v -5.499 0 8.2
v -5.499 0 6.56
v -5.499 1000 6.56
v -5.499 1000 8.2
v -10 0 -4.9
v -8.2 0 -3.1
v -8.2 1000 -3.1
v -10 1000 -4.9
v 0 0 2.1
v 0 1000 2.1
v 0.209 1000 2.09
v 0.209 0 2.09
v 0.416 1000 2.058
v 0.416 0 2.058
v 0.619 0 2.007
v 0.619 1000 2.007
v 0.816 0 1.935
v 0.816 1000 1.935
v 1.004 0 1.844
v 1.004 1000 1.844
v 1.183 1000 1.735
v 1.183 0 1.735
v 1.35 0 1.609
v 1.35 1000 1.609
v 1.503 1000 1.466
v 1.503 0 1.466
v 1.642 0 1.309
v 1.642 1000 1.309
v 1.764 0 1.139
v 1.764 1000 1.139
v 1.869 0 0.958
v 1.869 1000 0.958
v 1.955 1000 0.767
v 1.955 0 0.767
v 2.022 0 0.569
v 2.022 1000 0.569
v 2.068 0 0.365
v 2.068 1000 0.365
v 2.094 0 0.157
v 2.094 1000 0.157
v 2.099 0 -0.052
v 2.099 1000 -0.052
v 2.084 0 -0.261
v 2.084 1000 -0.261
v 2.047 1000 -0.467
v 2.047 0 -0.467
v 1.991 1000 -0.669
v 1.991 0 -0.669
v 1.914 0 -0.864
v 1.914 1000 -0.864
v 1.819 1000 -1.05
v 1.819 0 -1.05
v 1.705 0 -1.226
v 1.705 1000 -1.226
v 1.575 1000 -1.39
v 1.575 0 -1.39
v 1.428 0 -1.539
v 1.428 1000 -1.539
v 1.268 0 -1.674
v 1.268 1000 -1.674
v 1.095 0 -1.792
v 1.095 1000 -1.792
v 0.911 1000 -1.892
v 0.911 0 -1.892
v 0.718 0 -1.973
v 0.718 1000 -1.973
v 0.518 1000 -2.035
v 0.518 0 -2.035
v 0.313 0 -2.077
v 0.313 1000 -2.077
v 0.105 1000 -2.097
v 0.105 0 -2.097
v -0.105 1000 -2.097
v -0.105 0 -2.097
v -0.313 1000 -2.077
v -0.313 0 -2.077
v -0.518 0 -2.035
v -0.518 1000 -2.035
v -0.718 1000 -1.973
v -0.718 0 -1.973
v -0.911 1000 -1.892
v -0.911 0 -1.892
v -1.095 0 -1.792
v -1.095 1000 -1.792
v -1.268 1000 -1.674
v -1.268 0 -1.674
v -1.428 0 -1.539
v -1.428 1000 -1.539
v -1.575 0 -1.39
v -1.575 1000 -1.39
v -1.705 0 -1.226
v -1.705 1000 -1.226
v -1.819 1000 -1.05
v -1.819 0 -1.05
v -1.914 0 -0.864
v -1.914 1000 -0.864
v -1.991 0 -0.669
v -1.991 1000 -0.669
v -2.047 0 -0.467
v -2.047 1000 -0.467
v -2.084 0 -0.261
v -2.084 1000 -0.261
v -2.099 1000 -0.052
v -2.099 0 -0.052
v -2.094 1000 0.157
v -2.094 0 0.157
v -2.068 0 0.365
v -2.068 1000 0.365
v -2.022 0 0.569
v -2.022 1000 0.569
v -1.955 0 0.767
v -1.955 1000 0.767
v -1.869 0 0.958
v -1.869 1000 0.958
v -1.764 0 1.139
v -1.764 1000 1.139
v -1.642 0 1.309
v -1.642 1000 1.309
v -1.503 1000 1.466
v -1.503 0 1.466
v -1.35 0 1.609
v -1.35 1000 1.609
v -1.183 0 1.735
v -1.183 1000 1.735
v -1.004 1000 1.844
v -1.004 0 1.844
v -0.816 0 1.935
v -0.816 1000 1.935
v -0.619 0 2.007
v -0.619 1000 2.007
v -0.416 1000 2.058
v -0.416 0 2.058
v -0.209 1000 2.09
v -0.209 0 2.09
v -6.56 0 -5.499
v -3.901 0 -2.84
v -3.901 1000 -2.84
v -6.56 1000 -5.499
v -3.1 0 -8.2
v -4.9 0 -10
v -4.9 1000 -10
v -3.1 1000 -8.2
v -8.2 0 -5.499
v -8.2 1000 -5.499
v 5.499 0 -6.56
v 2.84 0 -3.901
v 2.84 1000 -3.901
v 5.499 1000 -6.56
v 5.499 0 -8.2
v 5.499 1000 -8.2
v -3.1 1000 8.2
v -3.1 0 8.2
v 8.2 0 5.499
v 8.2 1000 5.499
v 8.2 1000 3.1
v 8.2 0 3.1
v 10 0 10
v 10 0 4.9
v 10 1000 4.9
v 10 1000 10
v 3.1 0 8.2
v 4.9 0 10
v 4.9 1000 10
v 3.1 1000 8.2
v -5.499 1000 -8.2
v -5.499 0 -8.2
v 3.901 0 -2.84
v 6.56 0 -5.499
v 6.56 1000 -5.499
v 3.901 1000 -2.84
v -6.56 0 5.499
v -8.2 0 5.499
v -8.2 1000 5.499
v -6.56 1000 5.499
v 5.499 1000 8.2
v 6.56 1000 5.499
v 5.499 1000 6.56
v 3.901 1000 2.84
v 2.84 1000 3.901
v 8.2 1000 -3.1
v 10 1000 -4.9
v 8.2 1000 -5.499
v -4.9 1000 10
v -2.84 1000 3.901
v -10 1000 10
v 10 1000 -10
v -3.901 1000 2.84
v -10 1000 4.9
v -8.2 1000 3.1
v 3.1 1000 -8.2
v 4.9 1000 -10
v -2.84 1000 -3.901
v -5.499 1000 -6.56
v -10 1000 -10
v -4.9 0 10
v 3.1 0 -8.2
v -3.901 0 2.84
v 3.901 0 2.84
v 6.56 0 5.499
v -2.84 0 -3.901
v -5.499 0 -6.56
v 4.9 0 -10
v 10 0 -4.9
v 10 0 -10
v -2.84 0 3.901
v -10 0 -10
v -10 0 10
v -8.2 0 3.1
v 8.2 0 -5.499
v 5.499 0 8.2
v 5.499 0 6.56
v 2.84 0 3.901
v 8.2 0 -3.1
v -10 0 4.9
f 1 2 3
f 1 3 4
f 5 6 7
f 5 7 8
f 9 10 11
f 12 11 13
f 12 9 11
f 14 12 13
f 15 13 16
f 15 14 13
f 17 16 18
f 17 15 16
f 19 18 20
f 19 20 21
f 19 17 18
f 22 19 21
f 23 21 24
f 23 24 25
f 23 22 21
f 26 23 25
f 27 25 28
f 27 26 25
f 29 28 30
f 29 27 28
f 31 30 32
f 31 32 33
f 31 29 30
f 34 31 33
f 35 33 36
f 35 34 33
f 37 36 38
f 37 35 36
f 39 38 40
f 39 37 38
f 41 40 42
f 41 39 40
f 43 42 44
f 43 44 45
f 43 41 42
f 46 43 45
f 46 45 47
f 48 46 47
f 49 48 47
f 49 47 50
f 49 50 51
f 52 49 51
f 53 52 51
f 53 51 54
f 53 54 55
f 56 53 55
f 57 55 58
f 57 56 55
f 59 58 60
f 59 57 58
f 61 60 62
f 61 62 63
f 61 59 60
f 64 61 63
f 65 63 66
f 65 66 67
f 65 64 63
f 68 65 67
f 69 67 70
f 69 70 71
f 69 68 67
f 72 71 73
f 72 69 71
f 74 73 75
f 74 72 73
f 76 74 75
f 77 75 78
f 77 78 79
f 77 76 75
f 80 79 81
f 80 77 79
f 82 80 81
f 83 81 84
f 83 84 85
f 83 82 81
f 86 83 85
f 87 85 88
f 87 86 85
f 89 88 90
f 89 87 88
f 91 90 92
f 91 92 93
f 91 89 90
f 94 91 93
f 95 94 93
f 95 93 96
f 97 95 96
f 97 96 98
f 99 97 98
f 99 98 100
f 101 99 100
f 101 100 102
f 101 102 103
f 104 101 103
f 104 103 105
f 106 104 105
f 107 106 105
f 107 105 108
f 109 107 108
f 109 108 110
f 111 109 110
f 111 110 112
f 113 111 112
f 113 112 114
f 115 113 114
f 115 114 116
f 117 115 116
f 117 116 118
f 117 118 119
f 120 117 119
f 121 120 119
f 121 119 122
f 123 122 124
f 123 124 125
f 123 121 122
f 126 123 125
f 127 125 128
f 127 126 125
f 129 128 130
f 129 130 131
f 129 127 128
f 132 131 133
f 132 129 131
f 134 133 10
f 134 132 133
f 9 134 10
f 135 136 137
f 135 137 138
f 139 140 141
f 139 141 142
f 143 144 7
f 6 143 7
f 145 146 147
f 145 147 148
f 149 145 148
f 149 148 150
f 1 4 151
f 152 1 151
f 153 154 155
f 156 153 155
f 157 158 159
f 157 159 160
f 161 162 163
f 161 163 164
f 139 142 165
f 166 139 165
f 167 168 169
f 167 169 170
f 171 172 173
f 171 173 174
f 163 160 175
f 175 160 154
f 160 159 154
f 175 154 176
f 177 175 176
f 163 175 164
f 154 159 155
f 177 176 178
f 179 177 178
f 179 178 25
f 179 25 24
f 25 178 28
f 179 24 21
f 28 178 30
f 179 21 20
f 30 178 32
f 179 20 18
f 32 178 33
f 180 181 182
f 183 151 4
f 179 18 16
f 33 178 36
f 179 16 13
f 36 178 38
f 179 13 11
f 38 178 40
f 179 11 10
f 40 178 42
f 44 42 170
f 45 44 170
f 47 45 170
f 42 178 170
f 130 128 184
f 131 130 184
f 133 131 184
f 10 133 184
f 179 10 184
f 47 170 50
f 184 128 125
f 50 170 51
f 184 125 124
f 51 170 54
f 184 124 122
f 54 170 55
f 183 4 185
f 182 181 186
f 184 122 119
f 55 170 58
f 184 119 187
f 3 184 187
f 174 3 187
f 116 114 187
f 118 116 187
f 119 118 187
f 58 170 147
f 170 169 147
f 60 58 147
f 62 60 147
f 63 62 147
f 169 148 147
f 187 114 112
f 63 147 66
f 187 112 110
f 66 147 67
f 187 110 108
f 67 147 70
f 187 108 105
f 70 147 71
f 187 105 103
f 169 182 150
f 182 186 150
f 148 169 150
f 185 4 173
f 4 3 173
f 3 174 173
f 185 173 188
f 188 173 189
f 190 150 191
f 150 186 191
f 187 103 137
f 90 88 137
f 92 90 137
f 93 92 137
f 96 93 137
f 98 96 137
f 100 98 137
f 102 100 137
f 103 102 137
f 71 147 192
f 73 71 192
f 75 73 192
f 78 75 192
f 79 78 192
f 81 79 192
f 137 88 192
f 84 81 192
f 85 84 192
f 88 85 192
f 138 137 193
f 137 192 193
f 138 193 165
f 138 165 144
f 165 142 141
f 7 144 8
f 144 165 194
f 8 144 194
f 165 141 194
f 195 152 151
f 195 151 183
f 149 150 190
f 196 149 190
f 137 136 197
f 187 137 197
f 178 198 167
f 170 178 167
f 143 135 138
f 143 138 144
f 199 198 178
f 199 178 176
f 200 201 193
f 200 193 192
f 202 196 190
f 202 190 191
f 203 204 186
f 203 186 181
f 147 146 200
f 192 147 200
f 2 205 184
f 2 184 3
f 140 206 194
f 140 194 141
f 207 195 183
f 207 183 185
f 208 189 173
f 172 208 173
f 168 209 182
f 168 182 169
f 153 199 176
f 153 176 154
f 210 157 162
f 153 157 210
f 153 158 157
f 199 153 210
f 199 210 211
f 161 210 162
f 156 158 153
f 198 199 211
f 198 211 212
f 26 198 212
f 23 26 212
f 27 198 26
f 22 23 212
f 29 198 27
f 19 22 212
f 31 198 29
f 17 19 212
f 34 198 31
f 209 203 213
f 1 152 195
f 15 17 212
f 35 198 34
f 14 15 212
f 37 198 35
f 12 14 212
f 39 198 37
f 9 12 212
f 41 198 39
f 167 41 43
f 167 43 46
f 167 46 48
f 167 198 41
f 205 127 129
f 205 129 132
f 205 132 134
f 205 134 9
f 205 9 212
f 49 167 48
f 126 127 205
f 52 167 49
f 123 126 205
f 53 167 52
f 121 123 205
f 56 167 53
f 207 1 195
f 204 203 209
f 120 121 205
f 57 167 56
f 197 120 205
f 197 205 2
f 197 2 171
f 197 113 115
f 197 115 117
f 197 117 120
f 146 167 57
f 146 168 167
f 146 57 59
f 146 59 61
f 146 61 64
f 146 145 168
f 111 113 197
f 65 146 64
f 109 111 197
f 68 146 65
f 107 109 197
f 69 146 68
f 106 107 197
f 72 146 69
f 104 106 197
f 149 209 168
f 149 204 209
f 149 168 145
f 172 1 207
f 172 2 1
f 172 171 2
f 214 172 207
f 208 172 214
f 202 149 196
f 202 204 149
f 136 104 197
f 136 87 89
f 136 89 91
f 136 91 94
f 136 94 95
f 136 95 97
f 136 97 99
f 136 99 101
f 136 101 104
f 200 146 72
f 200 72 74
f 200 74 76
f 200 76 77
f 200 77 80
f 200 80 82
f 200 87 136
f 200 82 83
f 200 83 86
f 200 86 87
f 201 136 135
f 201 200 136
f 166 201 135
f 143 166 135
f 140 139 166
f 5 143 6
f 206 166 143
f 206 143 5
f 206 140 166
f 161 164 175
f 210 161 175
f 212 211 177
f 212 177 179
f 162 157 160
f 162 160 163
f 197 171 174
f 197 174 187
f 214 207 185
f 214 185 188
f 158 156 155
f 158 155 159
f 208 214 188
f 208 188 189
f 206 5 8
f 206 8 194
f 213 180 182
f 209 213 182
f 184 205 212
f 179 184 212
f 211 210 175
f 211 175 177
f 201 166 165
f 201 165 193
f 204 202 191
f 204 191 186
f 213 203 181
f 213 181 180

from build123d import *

# Parameters (mm, degrees)
SCHIZZO1_2_R                 = 2.1
ESTRUSIONE_ESTRUSIONE2_DEPTH = 1000


with BuildPart() as part:
    # Schizzo1<2> → Estrusione-Estrusione2 (new body)
    with BuildSketch(Plane(origin=(0, 0, 0), x_dir=(1, 0, 0), z_dir=(0, 1, 0))):
        Polygon((-10, 10), (-4.9, 10), (-3.1, 8.2), (-5.499339828, 8.2), (-5.499339828, 6.56), (-2.84, 3.900660172), (0, 3.900660172), (2.84, 3.900660172), (5.499339828, 6.56), (5.499339828, 8.2), (3.1, 8.2), (4.9, 10), (10, 10), (10, 4.9), (8.2, 3.1), (8.2, 5.499339828), (6.56, 5.499339828), (3.900660172, 2.84), (3.900660172, 0), (3.900660172, -2.84), (6.56, -5.499339828), (8.2, -5.499339828), (8.2, -3.1), (10, -4.9), (10, -10), (4.9, -10), (3.1, -8.2), (5.499339828, -8.2), (5.499339828, -6.56), (2.84, -3.900660172), (0, -3.900660172), (-2.84, -3.900660172), (-5.499339828, -6.56), (-5.499339828, -8.2), (-3.1, -8.2), (-4.9, -10), (-10, -10), (-10, -4.9), (-8.2, -3.1), (-8.2, -5.499339828), (-6.56, -5.499339828), (-3.900660172, -2.84), (-3.900660172, 0), (-3.900660172, 2.84), (-6.56, 5.499339828), (-8.2, 5.499339828), (-8.2, 3.1), (-10, 4.9), align=None)
        Circle(SCHIZZO1_2_R, mode=Mode.SUBTRACT)
    extrude(amount=ESTRUSIONE_ESTRUSIONE2_DEPTH)


solid = part.part
